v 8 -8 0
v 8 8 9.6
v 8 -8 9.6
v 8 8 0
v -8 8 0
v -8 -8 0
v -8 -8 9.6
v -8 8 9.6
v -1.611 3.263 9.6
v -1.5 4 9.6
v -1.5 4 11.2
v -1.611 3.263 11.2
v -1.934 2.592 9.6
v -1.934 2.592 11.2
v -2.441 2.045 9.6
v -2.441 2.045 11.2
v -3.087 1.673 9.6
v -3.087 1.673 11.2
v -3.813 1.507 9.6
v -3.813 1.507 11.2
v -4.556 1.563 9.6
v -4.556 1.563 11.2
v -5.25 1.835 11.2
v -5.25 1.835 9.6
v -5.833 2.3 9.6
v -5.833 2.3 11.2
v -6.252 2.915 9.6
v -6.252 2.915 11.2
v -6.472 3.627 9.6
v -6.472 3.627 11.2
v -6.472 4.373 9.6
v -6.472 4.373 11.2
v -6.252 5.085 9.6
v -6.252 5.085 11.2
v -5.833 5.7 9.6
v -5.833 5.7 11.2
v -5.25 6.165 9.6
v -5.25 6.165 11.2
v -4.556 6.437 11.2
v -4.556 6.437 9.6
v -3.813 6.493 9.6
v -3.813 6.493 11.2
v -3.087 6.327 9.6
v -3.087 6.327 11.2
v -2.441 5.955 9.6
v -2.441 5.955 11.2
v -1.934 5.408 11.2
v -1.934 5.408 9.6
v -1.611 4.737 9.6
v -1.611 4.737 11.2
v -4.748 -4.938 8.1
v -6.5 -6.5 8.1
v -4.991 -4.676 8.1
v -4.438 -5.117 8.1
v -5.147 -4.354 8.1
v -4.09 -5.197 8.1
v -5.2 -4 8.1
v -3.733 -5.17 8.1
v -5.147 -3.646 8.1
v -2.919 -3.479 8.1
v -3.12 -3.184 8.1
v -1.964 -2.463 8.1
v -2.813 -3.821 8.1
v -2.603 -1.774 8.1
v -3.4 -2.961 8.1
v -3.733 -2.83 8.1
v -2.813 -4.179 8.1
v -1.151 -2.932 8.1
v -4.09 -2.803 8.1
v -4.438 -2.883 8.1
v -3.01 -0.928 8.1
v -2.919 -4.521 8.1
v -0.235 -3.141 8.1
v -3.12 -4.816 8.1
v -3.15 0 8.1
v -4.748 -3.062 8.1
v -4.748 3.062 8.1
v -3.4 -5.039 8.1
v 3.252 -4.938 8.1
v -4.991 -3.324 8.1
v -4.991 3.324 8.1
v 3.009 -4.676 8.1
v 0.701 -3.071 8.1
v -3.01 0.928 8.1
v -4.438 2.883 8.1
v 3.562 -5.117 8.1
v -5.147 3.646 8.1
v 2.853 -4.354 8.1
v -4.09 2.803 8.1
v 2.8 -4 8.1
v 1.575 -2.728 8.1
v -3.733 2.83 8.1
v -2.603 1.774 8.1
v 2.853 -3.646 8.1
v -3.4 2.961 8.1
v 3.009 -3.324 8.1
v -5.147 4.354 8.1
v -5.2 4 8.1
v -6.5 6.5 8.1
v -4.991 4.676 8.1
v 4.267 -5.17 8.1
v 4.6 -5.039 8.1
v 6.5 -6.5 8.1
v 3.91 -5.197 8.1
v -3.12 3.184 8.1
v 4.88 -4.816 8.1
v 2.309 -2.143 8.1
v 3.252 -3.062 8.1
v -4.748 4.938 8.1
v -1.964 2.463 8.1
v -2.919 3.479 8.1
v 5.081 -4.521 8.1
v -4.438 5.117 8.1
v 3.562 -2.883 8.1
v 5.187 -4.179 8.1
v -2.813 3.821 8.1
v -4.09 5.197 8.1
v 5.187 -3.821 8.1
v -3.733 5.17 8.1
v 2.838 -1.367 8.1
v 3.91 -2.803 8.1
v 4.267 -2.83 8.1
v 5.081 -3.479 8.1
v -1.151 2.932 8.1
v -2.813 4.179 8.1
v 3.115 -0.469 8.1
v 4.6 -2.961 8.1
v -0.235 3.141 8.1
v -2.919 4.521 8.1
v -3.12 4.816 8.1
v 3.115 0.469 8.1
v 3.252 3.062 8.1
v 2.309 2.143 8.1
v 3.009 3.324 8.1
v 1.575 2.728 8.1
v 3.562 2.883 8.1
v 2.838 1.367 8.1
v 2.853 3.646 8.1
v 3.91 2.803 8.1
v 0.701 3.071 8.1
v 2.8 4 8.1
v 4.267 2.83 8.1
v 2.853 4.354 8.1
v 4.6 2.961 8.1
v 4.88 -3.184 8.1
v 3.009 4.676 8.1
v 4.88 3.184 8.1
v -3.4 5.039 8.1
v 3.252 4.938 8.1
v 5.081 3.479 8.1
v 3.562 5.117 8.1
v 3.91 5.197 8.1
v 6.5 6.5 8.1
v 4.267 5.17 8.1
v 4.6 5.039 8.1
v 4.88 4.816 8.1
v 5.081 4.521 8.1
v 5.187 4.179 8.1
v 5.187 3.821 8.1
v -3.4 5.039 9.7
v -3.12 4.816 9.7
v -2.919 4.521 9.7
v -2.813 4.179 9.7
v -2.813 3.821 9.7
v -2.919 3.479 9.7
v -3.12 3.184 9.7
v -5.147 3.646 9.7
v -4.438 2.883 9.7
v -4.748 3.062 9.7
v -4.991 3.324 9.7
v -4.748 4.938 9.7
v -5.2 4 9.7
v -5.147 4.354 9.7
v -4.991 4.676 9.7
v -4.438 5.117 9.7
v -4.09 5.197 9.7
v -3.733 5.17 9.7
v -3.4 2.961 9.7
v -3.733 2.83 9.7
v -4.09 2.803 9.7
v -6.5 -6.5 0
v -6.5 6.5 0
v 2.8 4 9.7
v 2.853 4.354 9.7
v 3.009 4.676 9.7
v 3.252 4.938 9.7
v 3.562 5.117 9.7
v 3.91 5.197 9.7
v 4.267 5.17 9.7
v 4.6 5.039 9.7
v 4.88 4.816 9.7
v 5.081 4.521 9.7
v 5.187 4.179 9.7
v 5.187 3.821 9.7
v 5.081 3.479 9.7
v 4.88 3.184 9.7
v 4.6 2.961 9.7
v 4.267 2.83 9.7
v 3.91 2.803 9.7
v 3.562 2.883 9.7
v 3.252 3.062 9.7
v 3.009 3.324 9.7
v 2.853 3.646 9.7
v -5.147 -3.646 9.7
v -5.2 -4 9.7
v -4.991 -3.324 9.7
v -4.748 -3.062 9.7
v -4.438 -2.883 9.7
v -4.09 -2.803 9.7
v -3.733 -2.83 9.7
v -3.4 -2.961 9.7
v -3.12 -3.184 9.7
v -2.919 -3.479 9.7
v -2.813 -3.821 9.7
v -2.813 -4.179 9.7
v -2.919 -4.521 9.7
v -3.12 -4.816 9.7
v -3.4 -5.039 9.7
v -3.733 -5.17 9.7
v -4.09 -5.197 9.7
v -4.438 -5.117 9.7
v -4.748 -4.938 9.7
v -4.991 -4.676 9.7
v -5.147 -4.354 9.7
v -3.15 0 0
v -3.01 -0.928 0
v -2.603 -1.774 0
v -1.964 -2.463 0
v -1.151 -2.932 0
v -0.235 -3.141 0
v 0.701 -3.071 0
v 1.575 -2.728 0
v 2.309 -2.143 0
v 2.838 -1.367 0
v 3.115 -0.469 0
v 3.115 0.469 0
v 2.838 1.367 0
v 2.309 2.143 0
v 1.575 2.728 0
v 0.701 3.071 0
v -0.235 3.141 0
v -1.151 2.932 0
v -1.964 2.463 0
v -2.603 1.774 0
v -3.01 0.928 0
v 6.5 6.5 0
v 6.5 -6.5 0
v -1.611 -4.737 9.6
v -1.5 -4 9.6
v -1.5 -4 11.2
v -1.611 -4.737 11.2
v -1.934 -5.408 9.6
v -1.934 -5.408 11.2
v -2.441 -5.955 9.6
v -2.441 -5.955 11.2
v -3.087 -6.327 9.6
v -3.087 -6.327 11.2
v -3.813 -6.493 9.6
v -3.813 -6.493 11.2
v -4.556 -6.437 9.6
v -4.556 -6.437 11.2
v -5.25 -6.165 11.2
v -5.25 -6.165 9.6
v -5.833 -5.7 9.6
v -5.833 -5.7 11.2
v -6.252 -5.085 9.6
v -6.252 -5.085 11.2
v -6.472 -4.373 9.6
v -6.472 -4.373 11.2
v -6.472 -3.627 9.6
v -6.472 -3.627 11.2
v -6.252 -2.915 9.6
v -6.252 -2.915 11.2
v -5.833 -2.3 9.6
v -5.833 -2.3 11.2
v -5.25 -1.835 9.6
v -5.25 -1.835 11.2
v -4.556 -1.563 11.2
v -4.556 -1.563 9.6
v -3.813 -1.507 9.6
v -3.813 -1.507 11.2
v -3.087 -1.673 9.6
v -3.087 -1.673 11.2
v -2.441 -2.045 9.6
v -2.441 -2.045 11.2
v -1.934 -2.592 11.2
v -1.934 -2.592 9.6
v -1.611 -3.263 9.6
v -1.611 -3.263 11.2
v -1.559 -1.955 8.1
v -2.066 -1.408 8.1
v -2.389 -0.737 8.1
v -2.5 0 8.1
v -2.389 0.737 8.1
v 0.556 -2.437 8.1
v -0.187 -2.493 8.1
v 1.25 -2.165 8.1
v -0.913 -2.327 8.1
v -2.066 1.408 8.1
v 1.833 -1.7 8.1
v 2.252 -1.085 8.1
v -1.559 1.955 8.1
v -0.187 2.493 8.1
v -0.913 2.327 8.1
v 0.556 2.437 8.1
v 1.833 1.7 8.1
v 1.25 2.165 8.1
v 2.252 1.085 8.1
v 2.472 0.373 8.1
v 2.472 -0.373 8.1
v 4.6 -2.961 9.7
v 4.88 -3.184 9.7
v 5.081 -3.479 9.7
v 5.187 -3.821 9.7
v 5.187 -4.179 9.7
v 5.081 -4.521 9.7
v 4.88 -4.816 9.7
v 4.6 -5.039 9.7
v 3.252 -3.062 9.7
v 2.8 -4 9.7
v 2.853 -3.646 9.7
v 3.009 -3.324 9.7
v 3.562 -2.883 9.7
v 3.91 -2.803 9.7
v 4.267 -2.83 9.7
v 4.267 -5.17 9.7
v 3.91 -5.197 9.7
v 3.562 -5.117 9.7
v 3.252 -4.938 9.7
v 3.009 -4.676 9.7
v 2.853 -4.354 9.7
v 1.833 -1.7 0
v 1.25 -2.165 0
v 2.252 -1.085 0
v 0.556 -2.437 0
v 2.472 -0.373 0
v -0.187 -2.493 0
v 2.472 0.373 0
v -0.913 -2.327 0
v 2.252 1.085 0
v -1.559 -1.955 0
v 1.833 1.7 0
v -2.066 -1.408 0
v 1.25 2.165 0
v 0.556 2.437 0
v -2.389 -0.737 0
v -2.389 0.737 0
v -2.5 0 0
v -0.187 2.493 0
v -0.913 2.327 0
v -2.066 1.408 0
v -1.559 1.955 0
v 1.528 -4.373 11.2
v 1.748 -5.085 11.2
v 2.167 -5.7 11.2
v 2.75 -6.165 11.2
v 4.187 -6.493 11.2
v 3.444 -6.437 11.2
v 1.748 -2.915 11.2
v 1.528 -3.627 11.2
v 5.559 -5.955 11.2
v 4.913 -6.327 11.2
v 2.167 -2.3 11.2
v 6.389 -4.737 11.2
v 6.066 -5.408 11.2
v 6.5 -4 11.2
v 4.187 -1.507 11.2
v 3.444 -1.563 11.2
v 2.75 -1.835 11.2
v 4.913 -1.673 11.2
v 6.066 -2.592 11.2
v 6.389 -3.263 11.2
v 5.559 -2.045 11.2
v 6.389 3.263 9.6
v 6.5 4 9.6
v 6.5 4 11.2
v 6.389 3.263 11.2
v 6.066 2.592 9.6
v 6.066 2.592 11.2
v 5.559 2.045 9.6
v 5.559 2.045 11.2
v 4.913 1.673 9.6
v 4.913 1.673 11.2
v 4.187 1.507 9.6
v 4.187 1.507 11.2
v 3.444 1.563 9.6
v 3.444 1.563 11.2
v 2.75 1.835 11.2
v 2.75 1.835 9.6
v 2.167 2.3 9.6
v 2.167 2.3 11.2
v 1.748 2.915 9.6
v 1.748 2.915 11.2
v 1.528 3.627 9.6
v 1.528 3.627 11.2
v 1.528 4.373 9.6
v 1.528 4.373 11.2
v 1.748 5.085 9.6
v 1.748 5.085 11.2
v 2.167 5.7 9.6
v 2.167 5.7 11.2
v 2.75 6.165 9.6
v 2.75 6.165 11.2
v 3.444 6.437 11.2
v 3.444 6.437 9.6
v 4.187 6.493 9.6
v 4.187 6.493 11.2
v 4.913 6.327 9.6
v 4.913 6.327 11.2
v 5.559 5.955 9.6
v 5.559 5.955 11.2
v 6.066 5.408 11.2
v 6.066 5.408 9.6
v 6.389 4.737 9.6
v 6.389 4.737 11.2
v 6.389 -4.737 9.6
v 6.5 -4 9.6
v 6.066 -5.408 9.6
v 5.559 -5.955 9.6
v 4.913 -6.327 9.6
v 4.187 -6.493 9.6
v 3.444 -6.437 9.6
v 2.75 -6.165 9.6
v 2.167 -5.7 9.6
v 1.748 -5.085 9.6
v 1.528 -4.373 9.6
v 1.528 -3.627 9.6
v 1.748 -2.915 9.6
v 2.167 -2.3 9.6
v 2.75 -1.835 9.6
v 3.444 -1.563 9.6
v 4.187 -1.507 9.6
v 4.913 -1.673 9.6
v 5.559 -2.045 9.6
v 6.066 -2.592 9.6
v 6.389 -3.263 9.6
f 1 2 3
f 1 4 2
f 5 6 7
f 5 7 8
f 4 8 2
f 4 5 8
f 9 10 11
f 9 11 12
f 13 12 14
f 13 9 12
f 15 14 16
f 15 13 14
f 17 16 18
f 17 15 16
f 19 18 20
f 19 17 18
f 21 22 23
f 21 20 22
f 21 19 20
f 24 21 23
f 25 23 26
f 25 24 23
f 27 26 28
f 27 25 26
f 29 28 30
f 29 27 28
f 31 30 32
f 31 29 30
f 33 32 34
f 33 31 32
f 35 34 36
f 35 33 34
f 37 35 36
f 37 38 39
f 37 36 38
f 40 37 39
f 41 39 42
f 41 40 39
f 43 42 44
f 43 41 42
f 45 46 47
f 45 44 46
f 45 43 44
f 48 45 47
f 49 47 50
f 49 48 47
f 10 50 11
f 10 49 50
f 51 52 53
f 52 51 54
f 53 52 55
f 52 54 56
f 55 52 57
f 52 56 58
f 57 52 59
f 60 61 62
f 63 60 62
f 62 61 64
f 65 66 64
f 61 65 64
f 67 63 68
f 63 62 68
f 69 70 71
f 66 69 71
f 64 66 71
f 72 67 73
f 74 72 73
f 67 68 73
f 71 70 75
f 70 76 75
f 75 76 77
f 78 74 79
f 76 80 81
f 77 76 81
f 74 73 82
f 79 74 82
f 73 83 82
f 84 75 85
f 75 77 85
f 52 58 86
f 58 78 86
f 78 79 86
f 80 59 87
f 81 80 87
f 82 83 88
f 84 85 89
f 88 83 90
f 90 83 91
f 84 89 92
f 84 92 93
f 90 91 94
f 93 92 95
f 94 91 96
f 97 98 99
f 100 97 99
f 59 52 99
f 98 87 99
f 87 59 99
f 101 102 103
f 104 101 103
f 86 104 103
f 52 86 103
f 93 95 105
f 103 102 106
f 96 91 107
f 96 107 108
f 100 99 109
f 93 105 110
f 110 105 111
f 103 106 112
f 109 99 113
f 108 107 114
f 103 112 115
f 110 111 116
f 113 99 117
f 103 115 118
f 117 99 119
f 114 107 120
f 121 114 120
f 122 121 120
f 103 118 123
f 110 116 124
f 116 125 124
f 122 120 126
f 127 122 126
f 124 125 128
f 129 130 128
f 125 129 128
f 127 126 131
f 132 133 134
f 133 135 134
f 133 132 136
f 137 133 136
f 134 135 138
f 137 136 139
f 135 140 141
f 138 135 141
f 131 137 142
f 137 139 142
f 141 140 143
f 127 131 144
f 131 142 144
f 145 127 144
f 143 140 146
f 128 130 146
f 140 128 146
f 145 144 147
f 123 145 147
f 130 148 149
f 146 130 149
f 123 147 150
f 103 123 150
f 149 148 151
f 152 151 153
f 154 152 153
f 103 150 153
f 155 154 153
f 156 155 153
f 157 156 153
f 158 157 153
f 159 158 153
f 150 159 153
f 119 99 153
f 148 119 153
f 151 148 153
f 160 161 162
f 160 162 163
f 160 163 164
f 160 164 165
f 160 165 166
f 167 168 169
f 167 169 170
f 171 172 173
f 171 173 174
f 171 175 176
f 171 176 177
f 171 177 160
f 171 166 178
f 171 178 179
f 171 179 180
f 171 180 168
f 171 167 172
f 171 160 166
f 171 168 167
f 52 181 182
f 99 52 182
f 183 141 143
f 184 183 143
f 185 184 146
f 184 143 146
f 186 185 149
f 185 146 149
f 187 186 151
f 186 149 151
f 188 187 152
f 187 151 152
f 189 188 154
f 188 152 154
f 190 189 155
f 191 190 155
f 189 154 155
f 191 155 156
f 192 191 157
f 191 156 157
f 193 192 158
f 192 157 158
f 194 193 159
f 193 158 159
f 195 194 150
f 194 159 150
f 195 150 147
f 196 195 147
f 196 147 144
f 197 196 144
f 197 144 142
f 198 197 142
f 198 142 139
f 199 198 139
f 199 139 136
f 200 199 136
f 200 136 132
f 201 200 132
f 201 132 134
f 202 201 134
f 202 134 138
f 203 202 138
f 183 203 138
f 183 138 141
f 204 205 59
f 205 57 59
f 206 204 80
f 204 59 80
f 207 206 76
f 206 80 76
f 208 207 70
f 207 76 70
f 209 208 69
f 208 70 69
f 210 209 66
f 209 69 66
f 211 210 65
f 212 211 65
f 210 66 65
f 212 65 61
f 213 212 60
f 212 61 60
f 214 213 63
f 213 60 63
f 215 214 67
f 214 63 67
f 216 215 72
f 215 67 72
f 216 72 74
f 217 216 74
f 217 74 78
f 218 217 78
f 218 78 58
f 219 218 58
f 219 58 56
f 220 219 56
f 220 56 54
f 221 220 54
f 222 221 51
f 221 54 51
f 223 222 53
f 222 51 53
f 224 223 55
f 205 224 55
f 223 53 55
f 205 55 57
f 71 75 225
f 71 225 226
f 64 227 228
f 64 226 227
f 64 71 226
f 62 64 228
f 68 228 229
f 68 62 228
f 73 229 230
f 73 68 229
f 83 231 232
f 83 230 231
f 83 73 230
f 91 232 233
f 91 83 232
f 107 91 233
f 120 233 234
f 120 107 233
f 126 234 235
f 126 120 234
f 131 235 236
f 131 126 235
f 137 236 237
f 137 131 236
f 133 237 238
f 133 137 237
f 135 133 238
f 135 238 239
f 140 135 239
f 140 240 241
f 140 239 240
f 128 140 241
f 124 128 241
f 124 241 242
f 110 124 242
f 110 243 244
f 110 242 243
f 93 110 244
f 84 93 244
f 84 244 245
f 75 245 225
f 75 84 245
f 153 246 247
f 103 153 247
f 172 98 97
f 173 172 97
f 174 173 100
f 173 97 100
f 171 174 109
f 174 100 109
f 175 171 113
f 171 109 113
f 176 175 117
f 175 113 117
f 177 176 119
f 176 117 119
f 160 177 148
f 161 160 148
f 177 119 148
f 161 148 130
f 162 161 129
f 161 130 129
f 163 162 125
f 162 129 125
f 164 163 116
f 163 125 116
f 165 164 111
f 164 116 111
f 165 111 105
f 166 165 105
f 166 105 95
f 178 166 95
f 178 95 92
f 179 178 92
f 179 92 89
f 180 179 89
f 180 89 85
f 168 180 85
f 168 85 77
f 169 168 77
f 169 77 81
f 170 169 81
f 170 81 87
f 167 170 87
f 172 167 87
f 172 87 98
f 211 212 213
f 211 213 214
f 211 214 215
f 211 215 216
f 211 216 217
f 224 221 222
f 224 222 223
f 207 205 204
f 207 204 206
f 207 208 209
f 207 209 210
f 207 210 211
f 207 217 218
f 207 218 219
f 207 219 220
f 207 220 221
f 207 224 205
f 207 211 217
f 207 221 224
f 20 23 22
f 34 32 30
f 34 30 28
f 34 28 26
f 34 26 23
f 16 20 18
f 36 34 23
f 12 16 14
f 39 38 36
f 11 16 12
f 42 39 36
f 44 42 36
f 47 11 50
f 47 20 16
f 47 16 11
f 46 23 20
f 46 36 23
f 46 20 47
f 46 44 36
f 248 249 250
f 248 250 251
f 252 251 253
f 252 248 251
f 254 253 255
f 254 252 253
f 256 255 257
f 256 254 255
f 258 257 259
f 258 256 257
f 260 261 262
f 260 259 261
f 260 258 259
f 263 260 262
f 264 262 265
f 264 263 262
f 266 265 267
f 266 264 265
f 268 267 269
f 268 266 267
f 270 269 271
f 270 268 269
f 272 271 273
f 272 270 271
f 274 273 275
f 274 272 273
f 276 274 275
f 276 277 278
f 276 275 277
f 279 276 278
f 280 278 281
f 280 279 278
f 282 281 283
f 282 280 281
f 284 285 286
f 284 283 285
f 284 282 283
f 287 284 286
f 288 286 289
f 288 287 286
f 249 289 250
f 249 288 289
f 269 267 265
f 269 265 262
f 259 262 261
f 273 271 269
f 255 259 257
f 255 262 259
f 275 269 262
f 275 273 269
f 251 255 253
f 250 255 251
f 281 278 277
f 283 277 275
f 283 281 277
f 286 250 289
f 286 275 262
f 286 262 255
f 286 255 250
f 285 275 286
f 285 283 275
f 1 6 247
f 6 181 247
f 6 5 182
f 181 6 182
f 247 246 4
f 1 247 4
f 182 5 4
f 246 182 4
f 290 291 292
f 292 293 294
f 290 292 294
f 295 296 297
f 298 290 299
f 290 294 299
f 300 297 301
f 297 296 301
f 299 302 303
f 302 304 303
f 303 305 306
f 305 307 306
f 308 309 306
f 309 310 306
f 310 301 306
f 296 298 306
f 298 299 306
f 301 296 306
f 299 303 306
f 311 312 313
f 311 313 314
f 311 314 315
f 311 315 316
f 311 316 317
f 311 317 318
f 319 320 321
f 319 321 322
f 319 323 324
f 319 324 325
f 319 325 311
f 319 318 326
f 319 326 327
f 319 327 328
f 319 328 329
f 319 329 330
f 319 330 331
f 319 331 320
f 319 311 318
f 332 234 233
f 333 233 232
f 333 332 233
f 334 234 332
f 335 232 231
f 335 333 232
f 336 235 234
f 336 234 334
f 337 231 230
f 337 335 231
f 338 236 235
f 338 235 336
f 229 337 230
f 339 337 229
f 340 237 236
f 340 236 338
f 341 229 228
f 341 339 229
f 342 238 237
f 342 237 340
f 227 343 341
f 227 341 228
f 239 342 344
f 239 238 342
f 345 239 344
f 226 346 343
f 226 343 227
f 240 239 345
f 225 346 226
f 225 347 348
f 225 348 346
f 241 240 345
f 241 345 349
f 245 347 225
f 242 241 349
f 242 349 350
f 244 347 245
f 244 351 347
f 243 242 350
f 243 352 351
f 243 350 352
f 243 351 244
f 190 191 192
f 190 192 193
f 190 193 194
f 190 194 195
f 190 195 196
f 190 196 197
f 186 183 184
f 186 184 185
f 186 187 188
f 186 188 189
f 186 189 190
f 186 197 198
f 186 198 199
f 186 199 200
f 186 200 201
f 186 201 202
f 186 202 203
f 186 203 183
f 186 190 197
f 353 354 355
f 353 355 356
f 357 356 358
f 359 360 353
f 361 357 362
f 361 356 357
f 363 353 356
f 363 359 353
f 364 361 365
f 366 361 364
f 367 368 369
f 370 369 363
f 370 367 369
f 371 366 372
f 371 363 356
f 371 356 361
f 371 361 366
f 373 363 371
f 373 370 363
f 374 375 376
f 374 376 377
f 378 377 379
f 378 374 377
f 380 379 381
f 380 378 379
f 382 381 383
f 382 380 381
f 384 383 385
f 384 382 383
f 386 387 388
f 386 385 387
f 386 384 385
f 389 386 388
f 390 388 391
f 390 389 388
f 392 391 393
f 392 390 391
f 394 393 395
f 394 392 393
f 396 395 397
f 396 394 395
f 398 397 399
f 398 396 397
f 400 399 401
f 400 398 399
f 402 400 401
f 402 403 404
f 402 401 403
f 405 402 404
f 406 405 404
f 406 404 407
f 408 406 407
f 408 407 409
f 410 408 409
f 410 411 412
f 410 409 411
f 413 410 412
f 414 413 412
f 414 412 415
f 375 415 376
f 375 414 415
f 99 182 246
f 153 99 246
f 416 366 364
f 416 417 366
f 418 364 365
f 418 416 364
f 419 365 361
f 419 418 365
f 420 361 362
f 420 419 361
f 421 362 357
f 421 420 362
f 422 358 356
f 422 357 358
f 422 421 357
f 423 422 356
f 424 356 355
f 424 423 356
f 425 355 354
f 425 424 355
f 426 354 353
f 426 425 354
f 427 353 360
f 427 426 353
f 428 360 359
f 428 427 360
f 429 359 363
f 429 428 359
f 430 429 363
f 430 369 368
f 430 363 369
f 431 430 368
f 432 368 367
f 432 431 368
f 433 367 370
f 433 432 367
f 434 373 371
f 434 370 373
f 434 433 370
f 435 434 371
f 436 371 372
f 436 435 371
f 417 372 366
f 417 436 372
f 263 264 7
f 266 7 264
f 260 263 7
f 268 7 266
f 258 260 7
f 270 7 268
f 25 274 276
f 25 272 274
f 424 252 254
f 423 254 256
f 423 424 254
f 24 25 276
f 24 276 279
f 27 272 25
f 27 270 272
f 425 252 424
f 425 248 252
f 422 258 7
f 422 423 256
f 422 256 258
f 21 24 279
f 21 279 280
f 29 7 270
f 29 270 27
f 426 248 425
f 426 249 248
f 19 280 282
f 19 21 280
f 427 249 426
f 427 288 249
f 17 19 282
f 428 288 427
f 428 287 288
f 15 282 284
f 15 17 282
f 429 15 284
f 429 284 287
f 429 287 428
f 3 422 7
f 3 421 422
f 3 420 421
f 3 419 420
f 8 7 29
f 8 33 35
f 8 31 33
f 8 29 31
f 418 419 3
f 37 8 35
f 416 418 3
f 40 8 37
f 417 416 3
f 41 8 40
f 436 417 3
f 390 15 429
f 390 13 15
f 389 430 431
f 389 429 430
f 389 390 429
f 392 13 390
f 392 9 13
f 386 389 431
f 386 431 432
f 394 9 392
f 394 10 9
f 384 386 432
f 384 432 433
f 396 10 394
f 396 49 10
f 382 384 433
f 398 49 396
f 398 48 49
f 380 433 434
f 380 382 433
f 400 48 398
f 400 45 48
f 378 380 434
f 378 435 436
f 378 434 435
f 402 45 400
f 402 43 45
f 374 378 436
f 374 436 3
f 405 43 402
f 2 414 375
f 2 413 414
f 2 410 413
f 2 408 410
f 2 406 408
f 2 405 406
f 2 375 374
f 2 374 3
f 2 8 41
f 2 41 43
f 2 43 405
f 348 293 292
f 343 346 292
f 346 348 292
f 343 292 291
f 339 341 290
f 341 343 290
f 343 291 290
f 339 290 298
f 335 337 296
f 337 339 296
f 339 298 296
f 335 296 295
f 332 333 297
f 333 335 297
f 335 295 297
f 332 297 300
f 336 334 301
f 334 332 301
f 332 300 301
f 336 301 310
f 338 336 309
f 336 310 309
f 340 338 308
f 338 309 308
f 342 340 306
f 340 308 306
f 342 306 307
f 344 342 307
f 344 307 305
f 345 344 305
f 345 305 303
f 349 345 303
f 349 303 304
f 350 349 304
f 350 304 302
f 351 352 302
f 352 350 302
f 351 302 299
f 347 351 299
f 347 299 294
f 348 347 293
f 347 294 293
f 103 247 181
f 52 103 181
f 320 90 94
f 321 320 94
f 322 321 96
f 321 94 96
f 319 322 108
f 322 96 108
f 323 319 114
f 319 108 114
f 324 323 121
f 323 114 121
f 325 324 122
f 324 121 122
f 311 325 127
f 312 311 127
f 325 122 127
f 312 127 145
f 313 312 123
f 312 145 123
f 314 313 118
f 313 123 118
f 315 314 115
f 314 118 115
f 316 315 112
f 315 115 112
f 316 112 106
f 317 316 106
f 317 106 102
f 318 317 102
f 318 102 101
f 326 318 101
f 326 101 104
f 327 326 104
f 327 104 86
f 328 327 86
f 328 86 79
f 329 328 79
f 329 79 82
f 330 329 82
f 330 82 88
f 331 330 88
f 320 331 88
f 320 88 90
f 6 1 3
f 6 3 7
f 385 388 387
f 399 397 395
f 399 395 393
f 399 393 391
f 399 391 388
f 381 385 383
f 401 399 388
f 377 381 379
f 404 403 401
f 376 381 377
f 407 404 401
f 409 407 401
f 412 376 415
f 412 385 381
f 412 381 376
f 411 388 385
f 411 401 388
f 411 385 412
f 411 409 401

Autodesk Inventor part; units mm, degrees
ref_plane "YZ Plane" through (0, 0, 0) normal (1, 0, 0) x (0, 1, 0)
ref_plane "XZ Plane" through (0, 0, 0) normal (0, 1, 0) x (-1, 0, 0)
ref_plane "XY Plane" through (0, 0, 0) normal (0, 0, 1) x (1, 0, 0)
sketch "Sketch1" plane through (0, 0, 0) normal (0, 0, 1) x (1, 0, 0)
  line L0 (-8, 8) -> (8, 8)
  line L1 (8, 8) -> (8, -8)
  line L2 (8, -8) -> (-8, -8)
  line L3 (-8, -8) -> (-8, 8)
  point P0 (0, 0)
  dimension "d0" = 16
  dimension "d1" = 16
  dimension "d2" = 8
  dimension "d3" = 8
extrude "Extrusion1" add sketch "Sketch1" along normal blind 9.6
shell "Shell1" thickness 1.5 removed faces 1 at (-2.6667, 2.6667, 0)
sketch "Sketch2" plane through (0, 0, 9.6) normal (0, 0, 1) x (1, 0, 0)
  circle A0 centre (4, -4) radius 2.5
  line L0 (8, 8) -> (8, -8) projected
  line L1 (8, -8) -> (-8, -8) projected
  dimension "d7" = 5
  dimension "d10" = 4
  dimension "d11" = 4
extrude "Extrusion2" add sketch "Sketch2" along normal blind 1.6
sketch "Sketch3" plane through (6.5, -6.5, 8.1) normal (0, 0, -1) x (-1, 0, 0)
  circle A0 centre (2.5, 2.5) radius 2.5 projected
  circle A1 centre (2.5, 2.5) radius 1.2
  point P0 (6.5, 6.5)
  dimension "d18" = 2.4
extrude "Extrusion3" cut sketch "Sketch3" against normal blind 1.6 contours A1
pattern_linear "Rectangular Pattern1" count 2 spacing 8 along (0, 1, 0) count 2 spacing 8 along (-1, 0, 0) of "Extrusion2", "Extrusion3"
sketch "Sketch4" plane through (6.5, -6.5, 8.1) normal (0, 0, -1) x (-1, 0, 0)
  circle A0 centre (2.5, 10.5) radius 1.2 projected
  circle A1 centre (2.5, 2.5) radius 1.2 projected
  line L0 (0, 13) -> (0, 0) projected
  line L1 (0, 0) -> (13, 0) projected
  circle A2 centre (6.5, 6.5) radius 3.15
  circle A3 centre (6.5, 6.5) radius 2.5
  point P0 (6.5, 6.5)
  dimension "d21" = 6.5
  dimension "d22" = 6.5
  dimension "d23" = 10.5
  dimension "d24" = 2.5
  dimension "d25" = 5
  dimension "d26" = 6.3
extrude "Extrusion4" add sketch "Sketch4" along normal up to surface (8.1 mm away) contours A2
pattern_of_one "Rectangular Pattern2"
equation "\"d0\" = 8 * WIDTH"
equation "\"d1\" = 8 * LENGTH"
equation "\"d2\" = 0.5 * d0"
equation "\"d3\" = 0.5 * d1"
equation "\"d4\" = HEIGHT"
equation "\"d21\" = 0.5 * d23 + 0.5 * d24"
equation "\"d22\" = d21"
equation "\"WIDTH\" = 2"
equation "\"HEIGHT\" = 9.6"
equation "\"LENGTH\" = 2"
properties part number "3003" material "Steel"
